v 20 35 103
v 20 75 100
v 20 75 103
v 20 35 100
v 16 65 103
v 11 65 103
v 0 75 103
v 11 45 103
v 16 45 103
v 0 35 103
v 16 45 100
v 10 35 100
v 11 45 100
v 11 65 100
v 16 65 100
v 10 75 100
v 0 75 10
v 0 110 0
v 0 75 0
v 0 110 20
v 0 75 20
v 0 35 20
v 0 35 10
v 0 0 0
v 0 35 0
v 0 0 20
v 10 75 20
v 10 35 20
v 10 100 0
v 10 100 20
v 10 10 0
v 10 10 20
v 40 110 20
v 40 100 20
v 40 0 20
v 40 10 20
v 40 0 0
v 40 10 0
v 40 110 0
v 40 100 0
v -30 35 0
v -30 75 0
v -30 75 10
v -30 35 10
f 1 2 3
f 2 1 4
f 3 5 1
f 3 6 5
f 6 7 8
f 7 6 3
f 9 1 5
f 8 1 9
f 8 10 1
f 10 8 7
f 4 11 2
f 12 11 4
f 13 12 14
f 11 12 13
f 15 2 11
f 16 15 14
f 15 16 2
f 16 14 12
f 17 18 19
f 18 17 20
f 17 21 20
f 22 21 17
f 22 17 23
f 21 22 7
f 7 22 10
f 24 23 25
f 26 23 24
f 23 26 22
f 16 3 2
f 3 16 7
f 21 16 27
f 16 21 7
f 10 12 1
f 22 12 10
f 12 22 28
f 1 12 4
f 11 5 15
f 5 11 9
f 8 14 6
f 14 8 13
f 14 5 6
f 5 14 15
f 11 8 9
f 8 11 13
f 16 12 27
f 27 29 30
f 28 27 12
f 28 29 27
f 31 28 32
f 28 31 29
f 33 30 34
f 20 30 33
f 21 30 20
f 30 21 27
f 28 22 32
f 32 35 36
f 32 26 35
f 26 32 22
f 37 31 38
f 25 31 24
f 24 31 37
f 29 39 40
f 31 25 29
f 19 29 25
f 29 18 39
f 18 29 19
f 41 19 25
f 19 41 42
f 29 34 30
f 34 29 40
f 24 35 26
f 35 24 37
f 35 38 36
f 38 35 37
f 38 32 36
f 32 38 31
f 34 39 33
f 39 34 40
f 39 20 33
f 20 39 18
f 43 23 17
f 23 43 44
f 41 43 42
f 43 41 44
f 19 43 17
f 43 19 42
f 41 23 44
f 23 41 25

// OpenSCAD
overall_width = 100;
base_height = 10;
overall_height = 100;

union(){
    cube([10,overall_width,20]){}
    cube([40,10,20]){}
    translate([0,overall_width,0]){
        cube([40,10,20]){}
    }
    translate([-30,35,0]){
        cube([40,40,10]){}
    }
    translate([0,35,0]){
        cube([10,40,overall_height]){}
    }
    difference(){
        translate([0,35,overall_height]){
           cube([20,40,3]){}
        }
        translate([11,45,overall_height-1]){
            cube([5,20,5]){}
        }
    }
}
